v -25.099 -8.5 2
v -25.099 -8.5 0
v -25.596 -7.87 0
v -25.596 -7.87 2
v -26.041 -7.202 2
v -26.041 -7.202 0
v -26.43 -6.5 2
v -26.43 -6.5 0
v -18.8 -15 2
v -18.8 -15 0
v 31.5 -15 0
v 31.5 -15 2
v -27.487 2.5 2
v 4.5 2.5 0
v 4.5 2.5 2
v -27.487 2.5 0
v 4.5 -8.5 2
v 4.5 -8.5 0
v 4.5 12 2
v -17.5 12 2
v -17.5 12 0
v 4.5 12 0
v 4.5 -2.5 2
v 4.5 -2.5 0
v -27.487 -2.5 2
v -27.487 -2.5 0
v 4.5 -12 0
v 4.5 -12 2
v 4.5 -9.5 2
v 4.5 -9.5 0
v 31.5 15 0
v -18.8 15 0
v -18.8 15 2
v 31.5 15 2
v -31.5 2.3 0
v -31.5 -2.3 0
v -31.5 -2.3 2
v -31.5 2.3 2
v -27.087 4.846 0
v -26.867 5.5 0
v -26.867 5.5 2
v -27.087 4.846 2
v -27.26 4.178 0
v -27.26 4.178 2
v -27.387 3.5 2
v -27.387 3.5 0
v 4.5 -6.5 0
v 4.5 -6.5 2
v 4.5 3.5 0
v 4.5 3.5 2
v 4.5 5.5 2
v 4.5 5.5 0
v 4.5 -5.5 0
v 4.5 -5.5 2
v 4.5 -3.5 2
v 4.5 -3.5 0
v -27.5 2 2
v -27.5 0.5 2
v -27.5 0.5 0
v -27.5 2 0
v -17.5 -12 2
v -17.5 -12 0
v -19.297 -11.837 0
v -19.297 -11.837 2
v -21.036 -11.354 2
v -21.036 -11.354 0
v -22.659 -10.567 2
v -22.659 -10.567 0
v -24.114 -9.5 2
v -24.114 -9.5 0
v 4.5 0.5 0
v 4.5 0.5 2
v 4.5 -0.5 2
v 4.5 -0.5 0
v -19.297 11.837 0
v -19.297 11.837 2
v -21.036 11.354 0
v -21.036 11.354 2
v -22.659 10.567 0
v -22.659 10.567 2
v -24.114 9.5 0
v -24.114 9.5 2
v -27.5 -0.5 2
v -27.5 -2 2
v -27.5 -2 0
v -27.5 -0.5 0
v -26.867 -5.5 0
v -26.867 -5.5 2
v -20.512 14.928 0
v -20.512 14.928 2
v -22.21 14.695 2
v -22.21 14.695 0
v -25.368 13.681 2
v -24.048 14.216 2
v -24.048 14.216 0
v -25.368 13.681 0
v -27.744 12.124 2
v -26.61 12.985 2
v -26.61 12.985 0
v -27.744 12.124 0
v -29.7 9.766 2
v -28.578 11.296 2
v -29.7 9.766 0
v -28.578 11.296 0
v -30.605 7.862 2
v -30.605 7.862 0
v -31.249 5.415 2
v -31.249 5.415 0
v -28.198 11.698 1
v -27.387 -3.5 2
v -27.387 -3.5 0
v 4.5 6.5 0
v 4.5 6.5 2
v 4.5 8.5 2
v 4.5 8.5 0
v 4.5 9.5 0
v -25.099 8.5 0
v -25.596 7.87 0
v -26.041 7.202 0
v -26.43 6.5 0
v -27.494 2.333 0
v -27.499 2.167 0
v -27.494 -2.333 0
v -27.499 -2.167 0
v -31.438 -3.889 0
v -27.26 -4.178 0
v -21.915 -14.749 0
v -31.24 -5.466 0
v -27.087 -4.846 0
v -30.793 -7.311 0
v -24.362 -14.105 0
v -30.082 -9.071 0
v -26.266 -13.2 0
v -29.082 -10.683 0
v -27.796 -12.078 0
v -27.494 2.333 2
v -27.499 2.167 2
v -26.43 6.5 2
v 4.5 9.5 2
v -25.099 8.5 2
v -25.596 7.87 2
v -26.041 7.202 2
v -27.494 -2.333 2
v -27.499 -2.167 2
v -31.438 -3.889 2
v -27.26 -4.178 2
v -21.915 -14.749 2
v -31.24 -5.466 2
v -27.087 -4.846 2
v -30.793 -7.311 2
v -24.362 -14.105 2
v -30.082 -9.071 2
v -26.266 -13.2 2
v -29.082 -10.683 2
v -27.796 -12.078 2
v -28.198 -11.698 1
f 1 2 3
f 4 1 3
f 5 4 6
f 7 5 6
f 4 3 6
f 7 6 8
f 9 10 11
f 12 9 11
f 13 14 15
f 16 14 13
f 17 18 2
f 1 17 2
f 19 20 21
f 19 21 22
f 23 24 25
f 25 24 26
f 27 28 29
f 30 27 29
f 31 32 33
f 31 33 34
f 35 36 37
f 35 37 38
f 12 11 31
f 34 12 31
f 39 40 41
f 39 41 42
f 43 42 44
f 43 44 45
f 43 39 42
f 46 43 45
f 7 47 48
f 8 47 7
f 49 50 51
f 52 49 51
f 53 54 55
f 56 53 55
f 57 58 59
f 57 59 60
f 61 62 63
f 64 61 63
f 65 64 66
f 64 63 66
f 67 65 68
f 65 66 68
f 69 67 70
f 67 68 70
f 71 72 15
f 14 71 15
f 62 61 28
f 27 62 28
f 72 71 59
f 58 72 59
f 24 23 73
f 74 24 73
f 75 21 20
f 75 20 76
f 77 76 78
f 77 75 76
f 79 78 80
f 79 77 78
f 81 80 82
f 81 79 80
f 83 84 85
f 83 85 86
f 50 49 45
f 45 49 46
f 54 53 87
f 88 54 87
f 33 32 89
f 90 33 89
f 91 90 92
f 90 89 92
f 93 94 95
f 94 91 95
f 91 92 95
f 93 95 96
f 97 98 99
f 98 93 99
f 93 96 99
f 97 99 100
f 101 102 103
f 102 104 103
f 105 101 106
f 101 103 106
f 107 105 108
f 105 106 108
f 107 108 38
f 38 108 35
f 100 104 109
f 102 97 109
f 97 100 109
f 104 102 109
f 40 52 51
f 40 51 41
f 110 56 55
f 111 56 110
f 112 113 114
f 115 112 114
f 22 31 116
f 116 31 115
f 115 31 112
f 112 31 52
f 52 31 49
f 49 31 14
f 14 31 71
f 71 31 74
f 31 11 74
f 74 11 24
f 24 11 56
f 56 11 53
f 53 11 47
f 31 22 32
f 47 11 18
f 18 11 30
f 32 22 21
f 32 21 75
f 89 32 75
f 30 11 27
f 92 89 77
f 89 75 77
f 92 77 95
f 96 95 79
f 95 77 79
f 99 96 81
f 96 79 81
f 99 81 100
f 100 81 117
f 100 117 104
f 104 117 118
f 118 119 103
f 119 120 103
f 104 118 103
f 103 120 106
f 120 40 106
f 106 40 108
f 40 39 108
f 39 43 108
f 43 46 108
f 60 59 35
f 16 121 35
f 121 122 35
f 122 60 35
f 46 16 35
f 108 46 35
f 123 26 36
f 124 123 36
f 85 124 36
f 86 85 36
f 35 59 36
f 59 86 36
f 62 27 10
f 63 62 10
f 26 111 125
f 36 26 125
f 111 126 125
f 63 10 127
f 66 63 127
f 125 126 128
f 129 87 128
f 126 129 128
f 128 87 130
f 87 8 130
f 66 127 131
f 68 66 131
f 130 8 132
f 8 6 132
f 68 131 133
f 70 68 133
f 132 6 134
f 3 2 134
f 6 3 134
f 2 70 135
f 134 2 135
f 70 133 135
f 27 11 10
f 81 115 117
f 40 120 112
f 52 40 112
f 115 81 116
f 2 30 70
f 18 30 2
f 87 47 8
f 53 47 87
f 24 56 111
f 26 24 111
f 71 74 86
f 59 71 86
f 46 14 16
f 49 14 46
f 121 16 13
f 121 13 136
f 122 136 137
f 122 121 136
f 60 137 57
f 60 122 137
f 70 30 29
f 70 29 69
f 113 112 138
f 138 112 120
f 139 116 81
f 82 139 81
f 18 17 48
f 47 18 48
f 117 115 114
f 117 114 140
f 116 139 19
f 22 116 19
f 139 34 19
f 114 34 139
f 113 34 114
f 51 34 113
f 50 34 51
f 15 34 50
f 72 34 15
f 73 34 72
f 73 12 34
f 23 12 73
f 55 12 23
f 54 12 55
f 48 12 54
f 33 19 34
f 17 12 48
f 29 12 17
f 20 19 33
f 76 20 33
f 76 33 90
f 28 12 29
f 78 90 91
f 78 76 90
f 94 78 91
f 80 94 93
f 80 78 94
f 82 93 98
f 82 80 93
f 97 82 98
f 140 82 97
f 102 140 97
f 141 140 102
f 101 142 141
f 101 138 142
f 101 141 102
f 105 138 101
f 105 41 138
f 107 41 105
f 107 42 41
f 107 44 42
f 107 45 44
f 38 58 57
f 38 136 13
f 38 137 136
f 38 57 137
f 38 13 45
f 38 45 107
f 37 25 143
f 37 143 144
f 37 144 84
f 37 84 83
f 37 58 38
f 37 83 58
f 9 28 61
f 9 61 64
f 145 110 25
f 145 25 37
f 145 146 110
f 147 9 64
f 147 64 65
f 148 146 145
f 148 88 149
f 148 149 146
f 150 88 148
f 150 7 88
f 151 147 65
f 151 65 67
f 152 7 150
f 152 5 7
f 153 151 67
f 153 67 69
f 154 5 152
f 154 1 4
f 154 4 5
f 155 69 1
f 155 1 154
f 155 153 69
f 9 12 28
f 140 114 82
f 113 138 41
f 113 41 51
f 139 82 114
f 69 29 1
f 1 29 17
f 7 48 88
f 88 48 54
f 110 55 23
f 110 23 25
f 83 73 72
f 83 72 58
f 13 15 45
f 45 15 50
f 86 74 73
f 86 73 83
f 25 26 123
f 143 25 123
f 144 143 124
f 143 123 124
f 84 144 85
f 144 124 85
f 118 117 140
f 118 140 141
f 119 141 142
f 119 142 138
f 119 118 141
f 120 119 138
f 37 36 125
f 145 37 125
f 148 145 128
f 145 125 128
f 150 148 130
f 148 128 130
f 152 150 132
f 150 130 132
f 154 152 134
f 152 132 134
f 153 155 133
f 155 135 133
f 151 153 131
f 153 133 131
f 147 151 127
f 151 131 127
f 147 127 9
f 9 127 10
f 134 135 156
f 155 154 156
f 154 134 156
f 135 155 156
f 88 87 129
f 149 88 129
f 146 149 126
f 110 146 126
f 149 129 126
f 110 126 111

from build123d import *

# Parameters (mm, degrees)
F0_W          = 63
F0_H          = 30
F1_DEPTH      = 2
F2_T1_DEPTH   = 65.5
F3_W          = 32
F3_H          = 24
F4_DEPTH      = 25
F5_R          = 10
F7_E2_W       = 32.4974397272
F7_E2_H       = 2
F7_E3_0_1_0_W = 32.4974397272
F7_E3_0_1_0_H = 2
F7_E3_0_2_0_W = 32.4974397272
F7_E3_0_2_0_H = 2
F7_E3_0_3_0_W = 32.4974397272
F7_E3_0_3_0_H = 2
F7_E3_0_4_0_W = 32.4974397272
F7_E3_0_4_0_H = 2
F7_E3_0_5_0_W = 32.4974397272
F7_E3_0_5_0_H = 2
F7_E3_0_6_0_W = 32.4974397272
F7_E3_0_6_0_H = 2
F8_DEPTH      = 0.5


# Not quite as in the source:
# - a fillet or chamfer that OpenCascade refuses, or shapes differently, is made with other operations: its cross-section is extruded or revolved along the edge and cut away or added


with BuildPart() as f1:
    # F0 (on Top) → F1 (new body)
    with BuildSketch(Plane.XY):
        Rectangle(F0_W, F0_H)
    extrude(amount=F1_DEPTH)

    # F2: fillet of radius 12.7 on 2 edges, made by hand

    # F2_s2 → F2_t1 (cut)
    with BuildSketch(Plane.XY.offset(-31.75)):
        with BuildLine():
            add(Edge.make_bspline(
                [(-18.8, 15), (-31.5, 15), (-31.5, 2.3)],
                knots=[0, 0, 0, 1, 1, 1], degree=2, weights=[1, 0.9230769231, 1]))
            Line((-31.5, 2.3), (-31.5, 15))
            Line((-31.5, 15), (-18.8, 15))
        make_face()
        with BuildLine():
            add(Edge.make_bspline(
                [(-31.5, -2.3), (-31.5, -15), (-18.8, -15)],
                knots=[0, 0, 0, 1, 1, 1], degree=2, weights=[1, 0.9230769231, 1]))
            Line((-18.8, -15), (-31.5, -15))
            Line((-31.5, -15), (-31.5, -2.3))
        make_face()
    extrude(amount=F2_T1_DEPTH, mode=Mode.SUBTRACT)

    # F3 (on face) → F4 (cut)
    with BuildSketch(Plane.XY.offset(2)):
        with Locations((-11.5, 0)):
            Rectangle(F3_W, F3_H)
    extrude(amount=-F4_DEPTH, mode=Mode.SUBTRACT)

    # F5
    f5_edges = [f1.edges().sort_by_distance(p)[0] for p in [
        (-27.5, 12, 1),
        (-27.5, -12, 1),
    ]]
    fillet(f5_edges, radius=F5_R)

    # F7_E2 (on explicit) + F7_E3_0_1_0 (on explicit) + F7_E3_0_2_0 (on explicit) + F7_E3_0_3_0 (on explicit) + F7_E3_0_4_0 (on explicit) + F7_E3_0_5_0 (on explicit) + F7_E3_0_6_0 (on explicit) → F8 (join, symmetric)
    with BuildSketch(Plane(origin=(4.5, -9, 2), x_dir=(-1, 0, 0), z_dir=(0, -1, 0))):
        with Locations((16.2487198636, 1)):
            Rectangle(F7_E2_W, F7_E2_H)
    with BuildSketch(Plane(origin=(4.5, -6, 2), x_dir=(-1, 0, 0), z_dir=(0, -1, 0))):
        with Locations((16.2487198636, 1)):
            Rectangle(F7_E3_0_1_0_W, F7_E3_0_1_0_H)
    with BuildSketch(Plane(origin=(4.5, -3, 2), x_dir=(-1, 0, 0), z_dir=(0, -1, 0))):
        with Locations((16.2487198636, 1)):
            Rectangle(F7_E3_0_2_0_W, F7_E3_0_2_0_H)
    with BuildSketch(Plane(origin=(4.5, 0, 2), x_dir=(-1, 0, 0), z_dir=(0, -1, 0))):
        with Locations((16.2487198636, 1)):
            Rectangle(F7_E3_0_3_0_W, F7_E3_0_3_0_H)
    with BuildSketch(Plane(origin=(4.5, 3, 2), x_dir=(-1, 0, 0), z_dir=(0, -1, 0))):
        with Locations((16.2487198636, 1)):
            Rectangle(F7_E3_0_4_0_W, F7_E3_0_4_0_H)
    with BuildSketch(Plane(origin=(4.5, 6, 2), x_dir=(-1, 0, 0), z_dir=(0, -1, 0))):
        with Locations((16.2487198636, 1)):
            Rectangle(F7_E3_0_5_0_W, F7_E3_0_5_0_H)
    with BuildSketch(Plane(origin=(4.5, 9, 2), x_dir=(-1, 0, 0), z_dir=(0, -1, 0))):
        with Locations((16.2487198636, 1)):
            Rectangle(F7_E3_0_6_0_W, F7_E3_0_6_0_H)
    extrude(amount=F8_DEPTH, both=True)


solid = f1.part
